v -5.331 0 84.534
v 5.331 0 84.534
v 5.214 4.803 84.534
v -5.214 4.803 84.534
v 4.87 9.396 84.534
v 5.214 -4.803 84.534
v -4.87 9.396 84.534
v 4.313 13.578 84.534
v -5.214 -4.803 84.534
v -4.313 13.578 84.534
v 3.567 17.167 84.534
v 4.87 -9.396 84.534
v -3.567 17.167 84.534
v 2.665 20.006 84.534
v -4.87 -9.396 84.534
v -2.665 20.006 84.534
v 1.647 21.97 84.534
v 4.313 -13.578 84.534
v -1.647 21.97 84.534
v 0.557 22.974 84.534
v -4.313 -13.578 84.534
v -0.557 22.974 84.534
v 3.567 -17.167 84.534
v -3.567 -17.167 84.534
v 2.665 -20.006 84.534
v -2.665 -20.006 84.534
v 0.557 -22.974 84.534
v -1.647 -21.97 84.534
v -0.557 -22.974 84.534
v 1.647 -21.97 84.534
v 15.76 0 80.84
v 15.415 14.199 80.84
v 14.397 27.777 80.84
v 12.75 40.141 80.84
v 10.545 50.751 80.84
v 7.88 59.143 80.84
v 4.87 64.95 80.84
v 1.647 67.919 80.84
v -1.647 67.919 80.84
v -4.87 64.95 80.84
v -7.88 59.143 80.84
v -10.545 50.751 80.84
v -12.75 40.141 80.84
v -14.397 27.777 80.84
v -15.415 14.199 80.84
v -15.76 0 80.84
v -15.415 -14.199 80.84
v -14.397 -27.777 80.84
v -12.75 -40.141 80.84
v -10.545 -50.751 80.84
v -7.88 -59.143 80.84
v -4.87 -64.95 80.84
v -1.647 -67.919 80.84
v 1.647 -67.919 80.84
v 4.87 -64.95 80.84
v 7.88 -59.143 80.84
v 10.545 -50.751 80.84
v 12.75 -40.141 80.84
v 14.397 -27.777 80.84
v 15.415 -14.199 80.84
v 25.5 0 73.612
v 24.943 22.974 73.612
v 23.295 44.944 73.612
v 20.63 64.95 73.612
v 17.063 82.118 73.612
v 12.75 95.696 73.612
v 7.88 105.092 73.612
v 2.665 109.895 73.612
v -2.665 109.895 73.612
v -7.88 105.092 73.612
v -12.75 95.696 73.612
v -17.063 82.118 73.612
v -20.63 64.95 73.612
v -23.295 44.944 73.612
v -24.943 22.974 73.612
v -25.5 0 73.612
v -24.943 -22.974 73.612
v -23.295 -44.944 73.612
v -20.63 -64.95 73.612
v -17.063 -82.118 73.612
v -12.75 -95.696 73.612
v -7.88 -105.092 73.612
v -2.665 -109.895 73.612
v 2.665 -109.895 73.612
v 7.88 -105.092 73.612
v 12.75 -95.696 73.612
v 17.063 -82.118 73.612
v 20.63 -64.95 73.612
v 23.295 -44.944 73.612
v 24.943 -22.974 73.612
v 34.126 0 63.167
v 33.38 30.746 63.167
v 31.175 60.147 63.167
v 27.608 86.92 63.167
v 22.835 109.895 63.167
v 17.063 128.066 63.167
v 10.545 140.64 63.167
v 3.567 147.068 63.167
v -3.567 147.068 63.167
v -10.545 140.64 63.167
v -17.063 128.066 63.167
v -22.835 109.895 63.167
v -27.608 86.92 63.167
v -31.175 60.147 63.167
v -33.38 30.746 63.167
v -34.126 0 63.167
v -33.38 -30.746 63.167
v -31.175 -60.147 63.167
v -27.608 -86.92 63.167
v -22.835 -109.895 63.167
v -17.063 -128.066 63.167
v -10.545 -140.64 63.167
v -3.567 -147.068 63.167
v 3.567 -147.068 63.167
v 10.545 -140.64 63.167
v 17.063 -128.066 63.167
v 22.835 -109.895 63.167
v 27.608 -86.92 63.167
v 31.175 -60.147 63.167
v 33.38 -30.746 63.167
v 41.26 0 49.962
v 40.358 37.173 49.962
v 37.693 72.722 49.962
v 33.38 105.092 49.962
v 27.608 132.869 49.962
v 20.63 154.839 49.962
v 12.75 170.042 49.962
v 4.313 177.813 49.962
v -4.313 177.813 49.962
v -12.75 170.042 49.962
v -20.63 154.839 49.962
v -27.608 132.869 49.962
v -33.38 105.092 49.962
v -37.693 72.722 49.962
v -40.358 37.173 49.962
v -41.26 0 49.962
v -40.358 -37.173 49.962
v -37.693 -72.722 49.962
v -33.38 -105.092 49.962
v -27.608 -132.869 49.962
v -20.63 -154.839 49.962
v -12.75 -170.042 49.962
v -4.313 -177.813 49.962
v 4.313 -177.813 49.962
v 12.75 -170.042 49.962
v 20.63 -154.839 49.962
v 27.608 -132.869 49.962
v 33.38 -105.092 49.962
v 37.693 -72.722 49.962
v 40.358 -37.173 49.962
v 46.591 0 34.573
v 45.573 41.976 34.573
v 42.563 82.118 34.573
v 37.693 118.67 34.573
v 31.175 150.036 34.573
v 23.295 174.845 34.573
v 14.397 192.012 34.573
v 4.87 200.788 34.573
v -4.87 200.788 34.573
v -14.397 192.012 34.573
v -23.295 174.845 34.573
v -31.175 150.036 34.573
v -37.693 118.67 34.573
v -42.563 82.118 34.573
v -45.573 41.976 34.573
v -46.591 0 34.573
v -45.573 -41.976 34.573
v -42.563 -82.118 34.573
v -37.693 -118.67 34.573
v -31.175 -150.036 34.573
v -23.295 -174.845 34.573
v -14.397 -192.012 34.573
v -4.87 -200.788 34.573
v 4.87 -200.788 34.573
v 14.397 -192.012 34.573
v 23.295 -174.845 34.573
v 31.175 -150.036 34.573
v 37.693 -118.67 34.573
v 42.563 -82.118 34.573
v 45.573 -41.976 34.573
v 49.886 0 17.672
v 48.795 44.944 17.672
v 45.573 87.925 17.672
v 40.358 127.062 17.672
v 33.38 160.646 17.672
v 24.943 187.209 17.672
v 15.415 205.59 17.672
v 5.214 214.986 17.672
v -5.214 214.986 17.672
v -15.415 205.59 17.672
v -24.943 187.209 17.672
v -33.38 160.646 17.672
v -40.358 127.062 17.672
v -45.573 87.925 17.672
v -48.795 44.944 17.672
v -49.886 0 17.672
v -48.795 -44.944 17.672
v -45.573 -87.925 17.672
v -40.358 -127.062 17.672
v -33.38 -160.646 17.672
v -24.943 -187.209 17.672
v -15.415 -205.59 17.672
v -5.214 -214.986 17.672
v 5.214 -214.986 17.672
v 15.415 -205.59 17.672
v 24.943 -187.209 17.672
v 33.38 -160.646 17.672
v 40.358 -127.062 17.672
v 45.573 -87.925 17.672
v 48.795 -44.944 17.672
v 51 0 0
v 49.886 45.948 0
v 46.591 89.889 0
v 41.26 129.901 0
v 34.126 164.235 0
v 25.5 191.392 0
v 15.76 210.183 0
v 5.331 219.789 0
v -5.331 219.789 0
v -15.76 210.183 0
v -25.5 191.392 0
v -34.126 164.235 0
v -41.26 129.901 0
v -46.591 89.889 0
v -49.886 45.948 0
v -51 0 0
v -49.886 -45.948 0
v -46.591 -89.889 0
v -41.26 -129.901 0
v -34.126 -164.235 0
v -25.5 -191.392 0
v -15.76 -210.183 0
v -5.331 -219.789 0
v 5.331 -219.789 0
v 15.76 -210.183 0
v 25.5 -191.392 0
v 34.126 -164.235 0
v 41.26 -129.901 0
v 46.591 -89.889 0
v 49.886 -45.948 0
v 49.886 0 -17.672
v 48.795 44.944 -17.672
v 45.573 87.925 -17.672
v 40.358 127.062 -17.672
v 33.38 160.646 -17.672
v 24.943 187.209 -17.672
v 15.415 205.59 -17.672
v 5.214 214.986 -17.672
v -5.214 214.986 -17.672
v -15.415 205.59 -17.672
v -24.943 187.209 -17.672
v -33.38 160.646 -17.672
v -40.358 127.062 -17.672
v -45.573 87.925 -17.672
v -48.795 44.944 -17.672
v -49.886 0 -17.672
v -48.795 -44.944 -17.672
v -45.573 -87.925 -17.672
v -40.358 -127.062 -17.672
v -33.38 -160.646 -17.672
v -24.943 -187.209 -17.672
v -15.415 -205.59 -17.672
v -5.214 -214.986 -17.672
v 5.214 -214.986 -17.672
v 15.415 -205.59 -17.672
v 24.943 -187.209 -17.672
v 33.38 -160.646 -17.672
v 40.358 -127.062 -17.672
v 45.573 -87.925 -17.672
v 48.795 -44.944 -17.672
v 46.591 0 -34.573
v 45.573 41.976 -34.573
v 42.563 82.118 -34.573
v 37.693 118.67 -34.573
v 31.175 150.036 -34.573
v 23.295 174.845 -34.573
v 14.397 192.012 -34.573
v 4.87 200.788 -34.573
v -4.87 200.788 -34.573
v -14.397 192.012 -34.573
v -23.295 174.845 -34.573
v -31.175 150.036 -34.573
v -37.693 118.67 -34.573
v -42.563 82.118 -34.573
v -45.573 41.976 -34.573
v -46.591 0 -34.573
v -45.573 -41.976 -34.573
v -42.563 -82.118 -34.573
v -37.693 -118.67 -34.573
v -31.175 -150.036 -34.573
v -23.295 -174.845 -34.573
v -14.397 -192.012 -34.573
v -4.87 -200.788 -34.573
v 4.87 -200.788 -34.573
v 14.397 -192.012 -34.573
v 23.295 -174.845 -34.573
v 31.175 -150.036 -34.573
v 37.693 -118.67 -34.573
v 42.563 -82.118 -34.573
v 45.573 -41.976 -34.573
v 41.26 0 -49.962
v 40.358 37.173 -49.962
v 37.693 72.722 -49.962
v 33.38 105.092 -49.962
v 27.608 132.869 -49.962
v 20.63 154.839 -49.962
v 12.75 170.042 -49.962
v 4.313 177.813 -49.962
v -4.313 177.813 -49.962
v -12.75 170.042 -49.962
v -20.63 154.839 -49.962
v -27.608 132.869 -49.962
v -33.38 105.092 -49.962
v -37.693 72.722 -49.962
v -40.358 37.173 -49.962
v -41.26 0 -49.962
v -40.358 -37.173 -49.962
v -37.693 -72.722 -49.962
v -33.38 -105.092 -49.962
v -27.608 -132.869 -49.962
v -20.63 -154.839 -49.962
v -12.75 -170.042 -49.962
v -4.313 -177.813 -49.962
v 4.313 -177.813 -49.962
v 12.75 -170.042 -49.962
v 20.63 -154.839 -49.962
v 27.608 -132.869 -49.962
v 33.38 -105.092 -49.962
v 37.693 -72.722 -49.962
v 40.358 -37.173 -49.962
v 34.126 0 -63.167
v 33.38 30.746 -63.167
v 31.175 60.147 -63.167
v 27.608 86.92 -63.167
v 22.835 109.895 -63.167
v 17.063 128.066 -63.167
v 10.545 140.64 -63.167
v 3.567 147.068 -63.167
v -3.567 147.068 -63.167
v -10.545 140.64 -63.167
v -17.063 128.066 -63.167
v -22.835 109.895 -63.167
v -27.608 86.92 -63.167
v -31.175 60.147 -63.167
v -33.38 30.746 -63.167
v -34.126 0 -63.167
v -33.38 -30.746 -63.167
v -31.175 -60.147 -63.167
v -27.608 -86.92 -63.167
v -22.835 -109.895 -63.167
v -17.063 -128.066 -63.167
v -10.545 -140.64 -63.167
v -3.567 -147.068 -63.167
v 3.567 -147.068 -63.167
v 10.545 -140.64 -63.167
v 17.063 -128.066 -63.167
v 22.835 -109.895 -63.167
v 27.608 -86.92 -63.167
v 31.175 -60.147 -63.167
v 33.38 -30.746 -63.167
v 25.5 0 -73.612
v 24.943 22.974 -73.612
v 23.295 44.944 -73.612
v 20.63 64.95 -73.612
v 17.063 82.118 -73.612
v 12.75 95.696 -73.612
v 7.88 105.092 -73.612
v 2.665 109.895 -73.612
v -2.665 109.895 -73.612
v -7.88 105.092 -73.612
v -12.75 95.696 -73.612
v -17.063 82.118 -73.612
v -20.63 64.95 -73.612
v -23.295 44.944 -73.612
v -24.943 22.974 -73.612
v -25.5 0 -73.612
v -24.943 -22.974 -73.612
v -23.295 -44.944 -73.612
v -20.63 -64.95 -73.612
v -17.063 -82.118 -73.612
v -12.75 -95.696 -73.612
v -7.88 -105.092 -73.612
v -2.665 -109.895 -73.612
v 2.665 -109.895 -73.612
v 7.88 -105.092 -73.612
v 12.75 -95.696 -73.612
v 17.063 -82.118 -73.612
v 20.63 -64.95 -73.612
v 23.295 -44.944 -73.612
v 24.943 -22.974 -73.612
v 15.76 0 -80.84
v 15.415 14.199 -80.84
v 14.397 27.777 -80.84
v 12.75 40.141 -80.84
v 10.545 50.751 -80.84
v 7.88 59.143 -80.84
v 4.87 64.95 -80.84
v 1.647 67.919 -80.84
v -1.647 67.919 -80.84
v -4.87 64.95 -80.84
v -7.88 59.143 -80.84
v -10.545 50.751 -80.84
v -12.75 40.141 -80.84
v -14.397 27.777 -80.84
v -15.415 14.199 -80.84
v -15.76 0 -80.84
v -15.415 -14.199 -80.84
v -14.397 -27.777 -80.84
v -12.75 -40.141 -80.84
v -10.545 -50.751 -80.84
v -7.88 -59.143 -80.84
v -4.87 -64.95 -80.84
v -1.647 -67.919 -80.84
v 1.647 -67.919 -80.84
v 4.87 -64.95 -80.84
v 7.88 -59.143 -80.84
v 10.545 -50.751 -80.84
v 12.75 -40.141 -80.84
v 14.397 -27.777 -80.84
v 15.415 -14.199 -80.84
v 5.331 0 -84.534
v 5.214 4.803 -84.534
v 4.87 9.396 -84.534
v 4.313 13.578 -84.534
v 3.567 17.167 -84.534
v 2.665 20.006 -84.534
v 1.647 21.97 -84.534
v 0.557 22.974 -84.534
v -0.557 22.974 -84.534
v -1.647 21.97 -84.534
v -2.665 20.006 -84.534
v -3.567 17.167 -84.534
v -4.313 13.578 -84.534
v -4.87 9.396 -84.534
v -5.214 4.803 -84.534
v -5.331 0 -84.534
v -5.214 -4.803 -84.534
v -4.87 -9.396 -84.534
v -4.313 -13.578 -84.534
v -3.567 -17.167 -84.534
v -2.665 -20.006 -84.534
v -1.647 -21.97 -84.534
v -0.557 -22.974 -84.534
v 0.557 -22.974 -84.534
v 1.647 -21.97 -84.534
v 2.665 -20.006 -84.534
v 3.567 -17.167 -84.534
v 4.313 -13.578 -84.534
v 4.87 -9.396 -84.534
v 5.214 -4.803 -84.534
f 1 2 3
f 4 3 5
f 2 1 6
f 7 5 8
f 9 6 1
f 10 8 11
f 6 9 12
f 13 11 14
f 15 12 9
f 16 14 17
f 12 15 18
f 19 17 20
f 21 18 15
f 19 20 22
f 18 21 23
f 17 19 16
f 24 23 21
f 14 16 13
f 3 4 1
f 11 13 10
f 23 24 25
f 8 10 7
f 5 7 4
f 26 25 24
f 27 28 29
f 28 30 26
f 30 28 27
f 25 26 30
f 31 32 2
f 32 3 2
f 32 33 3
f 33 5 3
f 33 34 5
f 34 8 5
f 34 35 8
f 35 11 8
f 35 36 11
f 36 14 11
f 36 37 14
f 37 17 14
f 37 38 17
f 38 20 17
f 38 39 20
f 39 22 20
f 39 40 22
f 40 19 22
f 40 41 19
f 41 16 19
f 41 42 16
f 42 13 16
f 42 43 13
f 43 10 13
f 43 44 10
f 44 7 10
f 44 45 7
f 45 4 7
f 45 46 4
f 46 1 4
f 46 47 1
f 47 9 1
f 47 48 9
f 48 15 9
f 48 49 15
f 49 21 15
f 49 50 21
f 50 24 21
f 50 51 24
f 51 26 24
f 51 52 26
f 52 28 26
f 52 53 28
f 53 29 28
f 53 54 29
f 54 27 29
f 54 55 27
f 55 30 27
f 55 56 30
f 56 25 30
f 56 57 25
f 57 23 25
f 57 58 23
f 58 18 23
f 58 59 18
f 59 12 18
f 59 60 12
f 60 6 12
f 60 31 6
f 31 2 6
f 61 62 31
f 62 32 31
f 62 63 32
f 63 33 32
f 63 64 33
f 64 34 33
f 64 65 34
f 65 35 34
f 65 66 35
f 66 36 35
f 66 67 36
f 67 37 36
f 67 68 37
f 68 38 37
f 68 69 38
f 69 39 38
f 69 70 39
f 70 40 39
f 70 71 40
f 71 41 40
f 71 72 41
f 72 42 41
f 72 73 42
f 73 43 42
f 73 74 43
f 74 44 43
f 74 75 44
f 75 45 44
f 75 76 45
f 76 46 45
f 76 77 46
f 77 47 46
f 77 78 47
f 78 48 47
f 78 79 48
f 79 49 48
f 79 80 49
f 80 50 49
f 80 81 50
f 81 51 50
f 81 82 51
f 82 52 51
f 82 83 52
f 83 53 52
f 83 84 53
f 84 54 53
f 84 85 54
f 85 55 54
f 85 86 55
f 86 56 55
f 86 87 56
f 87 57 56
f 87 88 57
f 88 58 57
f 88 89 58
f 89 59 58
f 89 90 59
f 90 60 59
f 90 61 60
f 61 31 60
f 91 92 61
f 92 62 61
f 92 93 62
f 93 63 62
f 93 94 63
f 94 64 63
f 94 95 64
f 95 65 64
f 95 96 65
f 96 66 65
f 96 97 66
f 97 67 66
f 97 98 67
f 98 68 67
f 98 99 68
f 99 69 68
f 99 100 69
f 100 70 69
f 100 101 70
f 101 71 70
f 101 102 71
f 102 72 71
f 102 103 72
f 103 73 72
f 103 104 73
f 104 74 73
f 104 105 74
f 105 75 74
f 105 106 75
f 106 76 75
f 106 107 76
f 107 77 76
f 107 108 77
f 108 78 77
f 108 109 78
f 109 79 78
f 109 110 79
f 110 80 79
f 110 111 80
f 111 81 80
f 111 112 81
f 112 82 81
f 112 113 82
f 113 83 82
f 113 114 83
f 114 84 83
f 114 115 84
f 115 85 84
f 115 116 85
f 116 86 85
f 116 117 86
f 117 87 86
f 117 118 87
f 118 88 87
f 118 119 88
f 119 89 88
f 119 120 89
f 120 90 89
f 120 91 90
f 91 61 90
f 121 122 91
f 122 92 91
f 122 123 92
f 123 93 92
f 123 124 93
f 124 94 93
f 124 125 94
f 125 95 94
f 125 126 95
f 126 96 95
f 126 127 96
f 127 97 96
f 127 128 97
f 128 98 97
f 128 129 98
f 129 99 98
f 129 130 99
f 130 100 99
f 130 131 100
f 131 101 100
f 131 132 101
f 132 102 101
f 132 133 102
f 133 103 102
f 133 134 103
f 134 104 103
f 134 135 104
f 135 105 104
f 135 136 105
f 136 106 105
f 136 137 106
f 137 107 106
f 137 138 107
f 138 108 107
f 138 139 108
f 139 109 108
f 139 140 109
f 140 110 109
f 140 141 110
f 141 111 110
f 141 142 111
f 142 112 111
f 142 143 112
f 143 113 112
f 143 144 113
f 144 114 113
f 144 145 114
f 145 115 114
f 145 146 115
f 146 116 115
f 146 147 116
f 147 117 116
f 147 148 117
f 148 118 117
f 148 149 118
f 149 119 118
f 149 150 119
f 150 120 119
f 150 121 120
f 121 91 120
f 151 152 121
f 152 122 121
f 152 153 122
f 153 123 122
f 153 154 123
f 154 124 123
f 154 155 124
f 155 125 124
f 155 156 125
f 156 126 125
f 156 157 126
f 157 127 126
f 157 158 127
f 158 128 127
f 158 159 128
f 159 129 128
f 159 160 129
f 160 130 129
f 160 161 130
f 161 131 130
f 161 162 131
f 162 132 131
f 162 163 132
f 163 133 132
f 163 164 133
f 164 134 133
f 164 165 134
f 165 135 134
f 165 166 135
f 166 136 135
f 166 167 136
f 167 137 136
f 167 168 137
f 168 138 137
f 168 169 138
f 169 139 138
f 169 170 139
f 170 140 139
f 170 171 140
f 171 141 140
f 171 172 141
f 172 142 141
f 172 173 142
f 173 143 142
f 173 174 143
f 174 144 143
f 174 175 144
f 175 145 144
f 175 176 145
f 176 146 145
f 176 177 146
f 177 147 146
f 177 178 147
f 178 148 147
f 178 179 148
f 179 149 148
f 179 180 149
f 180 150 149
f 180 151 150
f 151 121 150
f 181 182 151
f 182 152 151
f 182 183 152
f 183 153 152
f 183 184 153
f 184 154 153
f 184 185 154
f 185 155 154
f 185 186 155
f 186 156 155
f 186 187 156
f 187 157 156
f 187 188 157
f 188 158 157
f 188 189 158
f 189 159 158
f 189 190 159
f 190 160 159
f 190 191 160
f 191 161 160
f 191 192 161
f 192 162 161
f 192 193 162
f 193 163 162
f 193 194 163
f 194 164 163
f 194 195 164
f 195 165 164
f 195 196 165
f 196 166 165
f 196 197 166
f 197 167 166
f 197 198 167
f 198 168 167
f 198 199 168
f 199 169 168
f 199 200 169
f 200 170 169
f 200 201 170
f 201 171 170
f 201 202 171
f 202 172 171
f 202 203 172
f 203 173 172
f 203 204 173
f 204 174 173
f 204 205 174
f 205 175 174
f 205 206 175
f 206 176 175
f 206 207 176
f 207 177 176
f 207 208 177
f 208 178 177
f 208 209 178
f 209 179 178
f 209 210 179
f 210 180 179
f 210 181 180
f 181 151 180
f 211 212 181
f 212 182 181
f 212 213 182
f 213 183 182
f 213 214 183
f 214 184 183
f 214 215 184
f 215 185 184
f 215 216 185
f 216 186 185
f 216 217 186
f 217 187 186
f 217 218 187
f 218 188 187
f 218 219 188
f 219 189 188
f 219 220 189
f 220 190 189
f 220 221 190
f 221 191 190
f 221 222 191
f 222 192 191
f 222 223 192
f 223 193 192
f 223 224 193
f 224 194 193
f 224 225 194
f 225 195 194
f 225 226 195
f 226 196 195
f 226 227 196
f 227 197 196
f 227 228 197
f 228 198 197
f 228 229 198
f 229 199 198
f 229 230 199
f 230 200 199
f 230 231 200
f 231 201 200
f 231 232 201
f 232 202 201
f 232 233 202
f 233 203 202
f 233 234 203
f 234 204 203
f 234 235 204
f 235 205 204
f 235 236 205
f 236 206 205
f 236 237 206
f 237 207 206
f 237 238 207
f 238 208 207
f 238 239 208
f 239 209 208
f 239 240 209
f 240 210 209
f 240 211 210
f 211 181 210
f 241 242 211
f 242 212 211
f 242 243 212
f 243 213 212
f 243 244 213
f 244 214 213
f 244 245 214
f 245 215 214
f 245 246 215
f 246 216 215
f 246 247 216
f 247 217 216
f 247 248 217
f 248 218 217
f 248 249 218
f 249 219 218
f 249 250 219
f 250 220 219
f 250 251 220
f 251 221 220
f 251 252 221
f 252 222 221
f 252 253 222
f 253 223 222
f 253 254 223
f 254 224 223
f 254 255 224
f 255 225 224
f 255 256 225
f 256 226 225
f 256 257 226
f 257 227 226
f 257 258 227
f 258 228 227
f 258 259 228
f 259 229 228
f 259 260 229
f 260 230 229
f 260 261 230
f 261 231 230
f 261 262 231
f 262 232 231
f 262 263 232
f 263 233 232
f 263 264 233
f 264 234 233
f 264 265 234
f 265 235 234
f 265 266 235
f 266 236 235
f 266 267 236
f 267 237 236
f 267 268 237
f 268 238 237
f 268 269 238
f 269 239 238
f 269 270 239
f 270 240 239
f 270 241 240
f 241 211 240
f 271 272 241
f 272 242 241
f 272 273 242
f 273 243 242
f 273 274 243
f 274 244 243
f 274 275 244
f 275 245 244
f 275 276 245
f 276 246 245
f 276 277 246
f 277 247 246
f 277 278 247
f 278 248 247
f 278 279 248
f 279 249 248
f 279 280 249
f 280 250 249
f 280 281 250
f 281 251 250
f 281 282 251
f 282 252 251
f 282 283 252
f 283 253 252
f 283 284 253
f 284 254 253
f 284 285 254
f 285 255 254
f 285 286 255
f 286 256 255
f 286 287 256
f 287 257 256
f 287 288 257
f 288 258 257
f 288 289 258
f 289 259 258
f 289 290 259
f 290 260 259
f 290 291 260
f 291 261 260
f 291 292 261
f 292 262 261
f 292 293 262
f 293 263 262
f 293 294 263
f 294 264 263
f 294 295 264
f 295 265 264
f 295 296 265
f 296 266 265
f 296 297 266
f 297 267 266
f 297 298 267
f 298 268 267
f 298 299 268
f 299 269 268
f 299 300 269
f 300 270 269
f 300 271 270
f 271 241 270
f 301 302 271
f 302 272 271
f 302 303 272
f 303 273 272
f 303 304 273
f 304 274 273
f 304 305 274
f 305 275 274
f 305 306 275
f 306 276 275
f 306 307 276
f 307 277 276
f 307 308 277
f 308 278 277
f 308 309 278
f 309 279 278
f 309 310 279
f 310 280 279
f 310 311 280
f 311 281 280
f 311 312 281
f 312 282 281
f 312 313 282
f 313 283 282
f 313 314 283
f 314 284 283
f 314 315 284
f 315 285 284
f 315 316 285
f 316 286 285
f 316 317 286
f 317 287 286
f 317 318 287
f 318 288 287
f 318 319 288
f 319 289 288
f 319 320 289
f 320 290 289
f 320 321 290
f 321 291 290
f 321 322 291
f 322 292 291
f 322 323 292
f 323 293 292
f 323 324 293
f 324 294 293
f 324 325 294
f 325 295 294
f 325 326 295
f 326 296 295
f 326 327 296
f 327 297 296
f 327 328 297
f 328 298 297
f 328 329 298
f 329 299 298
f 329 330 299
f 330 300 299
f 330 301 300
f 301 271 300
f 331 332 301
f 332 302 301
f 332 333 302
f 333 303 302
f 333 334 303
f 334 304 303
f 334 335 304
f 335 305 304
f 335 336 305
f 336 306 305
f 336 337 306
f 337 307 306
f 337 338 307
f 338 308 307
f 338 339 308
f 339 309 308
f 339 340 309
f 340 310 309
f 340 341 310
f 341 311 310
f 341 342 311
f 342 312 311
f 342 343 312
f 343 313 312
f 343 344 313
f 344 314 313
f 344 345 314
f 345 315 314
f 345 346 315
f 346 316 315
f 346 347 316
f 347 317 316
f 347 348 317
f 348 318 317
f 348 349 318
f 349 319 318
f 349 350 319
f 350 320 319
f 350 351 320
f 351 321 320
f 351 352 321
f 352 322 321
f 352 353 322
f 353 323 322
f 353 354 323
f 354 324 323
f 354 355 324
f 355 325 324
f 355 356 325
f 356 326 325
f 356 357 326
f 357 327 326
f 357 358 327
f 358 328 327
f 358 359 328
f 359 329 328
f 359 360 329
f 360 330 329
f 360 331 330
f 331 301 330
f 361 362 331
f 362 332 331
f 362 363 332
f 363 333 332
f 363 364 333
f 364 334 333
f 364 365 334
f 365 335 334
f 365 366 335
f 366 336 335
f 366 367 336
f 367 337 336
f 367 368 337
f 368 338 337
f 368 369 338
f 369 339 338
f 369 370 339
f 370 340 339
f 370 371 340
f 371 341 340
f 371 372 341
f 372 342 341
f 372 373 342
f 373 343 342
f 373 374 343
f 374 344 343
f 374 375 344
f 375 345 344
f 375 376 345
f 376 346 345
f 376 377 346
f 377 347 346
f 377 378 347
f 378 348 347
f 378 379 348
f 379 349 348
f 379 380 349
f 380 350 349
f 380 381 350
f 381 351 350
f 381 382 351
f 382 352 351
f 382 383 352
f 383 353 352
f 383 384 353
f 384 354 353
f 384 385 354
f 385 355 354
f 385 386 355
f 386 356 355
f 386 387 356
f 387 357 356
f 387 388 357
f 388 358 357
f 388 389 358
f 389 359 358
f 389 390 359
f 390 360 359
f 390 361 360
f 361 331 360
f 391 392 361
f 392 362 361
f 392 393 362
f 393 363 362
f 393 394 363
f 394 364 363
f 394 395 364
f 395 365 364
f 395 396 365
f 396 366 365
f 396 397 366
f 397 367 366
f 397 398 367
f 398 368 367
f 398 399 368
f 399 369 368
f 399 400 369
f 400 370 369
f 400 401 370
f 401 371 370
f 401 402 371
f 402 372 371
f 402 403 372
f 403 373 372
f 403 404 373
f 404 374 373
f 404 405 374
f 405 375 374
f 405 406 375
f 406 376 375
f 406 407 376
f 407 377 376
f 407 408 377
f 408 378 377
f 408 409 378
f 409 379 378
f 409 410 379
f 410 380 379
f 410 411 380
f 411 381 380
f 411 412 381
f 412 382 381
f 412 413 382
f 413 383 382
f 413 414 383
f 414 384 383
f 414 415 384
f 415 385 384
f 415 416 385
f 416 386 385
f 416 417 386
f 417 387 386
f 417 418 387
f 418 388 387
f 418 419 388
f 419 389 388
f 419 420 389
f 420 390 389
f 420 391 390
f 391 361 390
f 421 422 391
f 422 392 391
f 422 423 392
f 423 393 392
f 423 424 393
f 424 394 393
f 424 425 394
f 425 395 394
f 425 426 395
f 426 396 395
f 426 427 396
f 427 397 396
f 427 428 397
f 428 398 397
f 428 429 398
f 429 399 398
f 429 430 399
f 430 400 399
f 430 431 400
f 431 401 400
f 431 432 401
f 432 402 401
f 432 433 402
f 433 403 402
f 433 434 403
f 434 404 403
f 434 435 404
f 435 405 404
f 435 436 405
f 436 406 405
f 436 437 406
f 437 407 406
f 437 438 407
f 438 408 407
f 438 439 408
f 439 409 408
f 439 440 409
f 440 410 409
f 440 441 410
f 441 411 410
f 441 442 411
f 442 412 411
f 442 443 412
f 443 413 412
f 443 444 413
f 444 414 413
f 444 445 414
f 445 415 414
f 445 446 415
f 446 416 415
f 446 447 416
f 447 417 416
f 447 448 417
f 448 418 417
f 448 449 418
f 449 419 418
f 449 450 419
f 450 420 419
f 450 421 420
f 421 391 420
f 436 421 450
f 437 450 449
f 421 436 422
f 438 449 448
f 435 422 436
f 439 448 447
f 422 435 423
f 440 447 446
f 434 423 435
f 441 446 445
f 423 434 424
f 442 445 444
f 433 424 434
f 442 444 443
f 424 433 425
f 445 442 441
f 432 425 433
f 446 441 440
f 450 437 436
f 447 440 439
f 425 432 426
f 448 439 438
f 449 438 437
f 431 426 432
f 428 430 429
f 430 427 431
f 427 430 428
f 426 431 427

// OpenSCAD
// Generated by SolidPython 1.0.1 on 2020-07-29 00:46:45


scale(v = [3, 13, 5]) {
	sphere(r = 17);
}
/***********************************************
*********      SolidPython code:      **********
************************************************
 
# import packages: SolidPython
from solid import *
from solid.utils import *
from itertools import chain, combinations, permutations


class Resize:

    def __init__(self, scad_file):
        self.scad_file = scad_file
        #self.scad_file = import_scad(scad_file)
        # cone/cylinder param:
        self.r1 = 0
        self.r2 = 0
        self.h = 0
        # rectangular prism param:
        self.w = 0
        self.l = 0
        # ellipse param:
        self.r = 0

    # import OpenScad code (file name corresponds to shape)


    # classify shape + parameters
    def assign(self, param1, param2, param3):
        if self.scad_file == 'cone.scad':
            self.r1 = param1
            self.r2 = param2
            self.h = param3
        elif self.scad_file == 'cylinder.scad':
            self.r1 = param1
            self.r2 = param2
            self.h = param3
        elif self.scad_file == 'rectangularPrism.scad':
            self.h = param1
            self.l = param2
            self.w = param3
        else:
            self.r = param1
            self.h = param2

    # resize parameters
    def iterate(self):
        x = range(3, 20, 2)
        i = 1
        if self.scad_file == 'cone.scad':
            tempList = list(permutations(x, 2))
            for temp in tempList:
                param1 = temp[0]
                param2 = temp[1]
                filepath = 'produced_scad_files/' + 'cone' + str(param1) + '_' + str(param2) + '_' + '.scad'
                scad_render_to_file(cylinder(h=param1, r1=param2, r2=0), filepath)

        elif self.scad_file == 'cylinder.scad':
            tempList = list(permutations(x, 3))
            for temp in tempList:
                param1 = temp[0]
                param2 = temp[1]
                filepath = 'produced_scad_files/' + 'cylinder' + str(param1) + '_' + str(param2) + '_' + '.scad'
                scad_render_to_file(cylinder(h=param1, r1=param2, r2=param2), filepath)

        elif self.scad_file == 'rectangularPrism.scad':
            tempList = list(permutations(x, 3))
            for temp in tempList:
                param1 = temp[0]
                param2 = temp[1]
                param3 = temp[2]
                filepath = 'produced_scad_files/' + 'rectangularPrism' + str(param1) + '_' + str(param2) + '_' + str(
                    param3) + '.scad'
                scad_render_to_file(cube(size=(param1, param2, param3)), filepath)

        elif self.scad_file == 'ellipse.scad':
            tempList = list(permutations(x, 4))
            for temp in tempList:
                param1 = temp[0]
                param2 = temp[1]
                param3 = temp[2]
                param4 = temp[3]
                filepath = 'produced_scad_files/' + 'ellipse' + str(param1) + '_' + str(param2) + '_' + str(param3) + '_' + str(param4) + '.scad'
                scad_render_to_file(scale([param1, param2, param3])(sphere(r=param4)), filepath)

    def render_to_scadfile(self):
        scad_render_to_file(scad, 'example.scad') 
 
************************************************/
